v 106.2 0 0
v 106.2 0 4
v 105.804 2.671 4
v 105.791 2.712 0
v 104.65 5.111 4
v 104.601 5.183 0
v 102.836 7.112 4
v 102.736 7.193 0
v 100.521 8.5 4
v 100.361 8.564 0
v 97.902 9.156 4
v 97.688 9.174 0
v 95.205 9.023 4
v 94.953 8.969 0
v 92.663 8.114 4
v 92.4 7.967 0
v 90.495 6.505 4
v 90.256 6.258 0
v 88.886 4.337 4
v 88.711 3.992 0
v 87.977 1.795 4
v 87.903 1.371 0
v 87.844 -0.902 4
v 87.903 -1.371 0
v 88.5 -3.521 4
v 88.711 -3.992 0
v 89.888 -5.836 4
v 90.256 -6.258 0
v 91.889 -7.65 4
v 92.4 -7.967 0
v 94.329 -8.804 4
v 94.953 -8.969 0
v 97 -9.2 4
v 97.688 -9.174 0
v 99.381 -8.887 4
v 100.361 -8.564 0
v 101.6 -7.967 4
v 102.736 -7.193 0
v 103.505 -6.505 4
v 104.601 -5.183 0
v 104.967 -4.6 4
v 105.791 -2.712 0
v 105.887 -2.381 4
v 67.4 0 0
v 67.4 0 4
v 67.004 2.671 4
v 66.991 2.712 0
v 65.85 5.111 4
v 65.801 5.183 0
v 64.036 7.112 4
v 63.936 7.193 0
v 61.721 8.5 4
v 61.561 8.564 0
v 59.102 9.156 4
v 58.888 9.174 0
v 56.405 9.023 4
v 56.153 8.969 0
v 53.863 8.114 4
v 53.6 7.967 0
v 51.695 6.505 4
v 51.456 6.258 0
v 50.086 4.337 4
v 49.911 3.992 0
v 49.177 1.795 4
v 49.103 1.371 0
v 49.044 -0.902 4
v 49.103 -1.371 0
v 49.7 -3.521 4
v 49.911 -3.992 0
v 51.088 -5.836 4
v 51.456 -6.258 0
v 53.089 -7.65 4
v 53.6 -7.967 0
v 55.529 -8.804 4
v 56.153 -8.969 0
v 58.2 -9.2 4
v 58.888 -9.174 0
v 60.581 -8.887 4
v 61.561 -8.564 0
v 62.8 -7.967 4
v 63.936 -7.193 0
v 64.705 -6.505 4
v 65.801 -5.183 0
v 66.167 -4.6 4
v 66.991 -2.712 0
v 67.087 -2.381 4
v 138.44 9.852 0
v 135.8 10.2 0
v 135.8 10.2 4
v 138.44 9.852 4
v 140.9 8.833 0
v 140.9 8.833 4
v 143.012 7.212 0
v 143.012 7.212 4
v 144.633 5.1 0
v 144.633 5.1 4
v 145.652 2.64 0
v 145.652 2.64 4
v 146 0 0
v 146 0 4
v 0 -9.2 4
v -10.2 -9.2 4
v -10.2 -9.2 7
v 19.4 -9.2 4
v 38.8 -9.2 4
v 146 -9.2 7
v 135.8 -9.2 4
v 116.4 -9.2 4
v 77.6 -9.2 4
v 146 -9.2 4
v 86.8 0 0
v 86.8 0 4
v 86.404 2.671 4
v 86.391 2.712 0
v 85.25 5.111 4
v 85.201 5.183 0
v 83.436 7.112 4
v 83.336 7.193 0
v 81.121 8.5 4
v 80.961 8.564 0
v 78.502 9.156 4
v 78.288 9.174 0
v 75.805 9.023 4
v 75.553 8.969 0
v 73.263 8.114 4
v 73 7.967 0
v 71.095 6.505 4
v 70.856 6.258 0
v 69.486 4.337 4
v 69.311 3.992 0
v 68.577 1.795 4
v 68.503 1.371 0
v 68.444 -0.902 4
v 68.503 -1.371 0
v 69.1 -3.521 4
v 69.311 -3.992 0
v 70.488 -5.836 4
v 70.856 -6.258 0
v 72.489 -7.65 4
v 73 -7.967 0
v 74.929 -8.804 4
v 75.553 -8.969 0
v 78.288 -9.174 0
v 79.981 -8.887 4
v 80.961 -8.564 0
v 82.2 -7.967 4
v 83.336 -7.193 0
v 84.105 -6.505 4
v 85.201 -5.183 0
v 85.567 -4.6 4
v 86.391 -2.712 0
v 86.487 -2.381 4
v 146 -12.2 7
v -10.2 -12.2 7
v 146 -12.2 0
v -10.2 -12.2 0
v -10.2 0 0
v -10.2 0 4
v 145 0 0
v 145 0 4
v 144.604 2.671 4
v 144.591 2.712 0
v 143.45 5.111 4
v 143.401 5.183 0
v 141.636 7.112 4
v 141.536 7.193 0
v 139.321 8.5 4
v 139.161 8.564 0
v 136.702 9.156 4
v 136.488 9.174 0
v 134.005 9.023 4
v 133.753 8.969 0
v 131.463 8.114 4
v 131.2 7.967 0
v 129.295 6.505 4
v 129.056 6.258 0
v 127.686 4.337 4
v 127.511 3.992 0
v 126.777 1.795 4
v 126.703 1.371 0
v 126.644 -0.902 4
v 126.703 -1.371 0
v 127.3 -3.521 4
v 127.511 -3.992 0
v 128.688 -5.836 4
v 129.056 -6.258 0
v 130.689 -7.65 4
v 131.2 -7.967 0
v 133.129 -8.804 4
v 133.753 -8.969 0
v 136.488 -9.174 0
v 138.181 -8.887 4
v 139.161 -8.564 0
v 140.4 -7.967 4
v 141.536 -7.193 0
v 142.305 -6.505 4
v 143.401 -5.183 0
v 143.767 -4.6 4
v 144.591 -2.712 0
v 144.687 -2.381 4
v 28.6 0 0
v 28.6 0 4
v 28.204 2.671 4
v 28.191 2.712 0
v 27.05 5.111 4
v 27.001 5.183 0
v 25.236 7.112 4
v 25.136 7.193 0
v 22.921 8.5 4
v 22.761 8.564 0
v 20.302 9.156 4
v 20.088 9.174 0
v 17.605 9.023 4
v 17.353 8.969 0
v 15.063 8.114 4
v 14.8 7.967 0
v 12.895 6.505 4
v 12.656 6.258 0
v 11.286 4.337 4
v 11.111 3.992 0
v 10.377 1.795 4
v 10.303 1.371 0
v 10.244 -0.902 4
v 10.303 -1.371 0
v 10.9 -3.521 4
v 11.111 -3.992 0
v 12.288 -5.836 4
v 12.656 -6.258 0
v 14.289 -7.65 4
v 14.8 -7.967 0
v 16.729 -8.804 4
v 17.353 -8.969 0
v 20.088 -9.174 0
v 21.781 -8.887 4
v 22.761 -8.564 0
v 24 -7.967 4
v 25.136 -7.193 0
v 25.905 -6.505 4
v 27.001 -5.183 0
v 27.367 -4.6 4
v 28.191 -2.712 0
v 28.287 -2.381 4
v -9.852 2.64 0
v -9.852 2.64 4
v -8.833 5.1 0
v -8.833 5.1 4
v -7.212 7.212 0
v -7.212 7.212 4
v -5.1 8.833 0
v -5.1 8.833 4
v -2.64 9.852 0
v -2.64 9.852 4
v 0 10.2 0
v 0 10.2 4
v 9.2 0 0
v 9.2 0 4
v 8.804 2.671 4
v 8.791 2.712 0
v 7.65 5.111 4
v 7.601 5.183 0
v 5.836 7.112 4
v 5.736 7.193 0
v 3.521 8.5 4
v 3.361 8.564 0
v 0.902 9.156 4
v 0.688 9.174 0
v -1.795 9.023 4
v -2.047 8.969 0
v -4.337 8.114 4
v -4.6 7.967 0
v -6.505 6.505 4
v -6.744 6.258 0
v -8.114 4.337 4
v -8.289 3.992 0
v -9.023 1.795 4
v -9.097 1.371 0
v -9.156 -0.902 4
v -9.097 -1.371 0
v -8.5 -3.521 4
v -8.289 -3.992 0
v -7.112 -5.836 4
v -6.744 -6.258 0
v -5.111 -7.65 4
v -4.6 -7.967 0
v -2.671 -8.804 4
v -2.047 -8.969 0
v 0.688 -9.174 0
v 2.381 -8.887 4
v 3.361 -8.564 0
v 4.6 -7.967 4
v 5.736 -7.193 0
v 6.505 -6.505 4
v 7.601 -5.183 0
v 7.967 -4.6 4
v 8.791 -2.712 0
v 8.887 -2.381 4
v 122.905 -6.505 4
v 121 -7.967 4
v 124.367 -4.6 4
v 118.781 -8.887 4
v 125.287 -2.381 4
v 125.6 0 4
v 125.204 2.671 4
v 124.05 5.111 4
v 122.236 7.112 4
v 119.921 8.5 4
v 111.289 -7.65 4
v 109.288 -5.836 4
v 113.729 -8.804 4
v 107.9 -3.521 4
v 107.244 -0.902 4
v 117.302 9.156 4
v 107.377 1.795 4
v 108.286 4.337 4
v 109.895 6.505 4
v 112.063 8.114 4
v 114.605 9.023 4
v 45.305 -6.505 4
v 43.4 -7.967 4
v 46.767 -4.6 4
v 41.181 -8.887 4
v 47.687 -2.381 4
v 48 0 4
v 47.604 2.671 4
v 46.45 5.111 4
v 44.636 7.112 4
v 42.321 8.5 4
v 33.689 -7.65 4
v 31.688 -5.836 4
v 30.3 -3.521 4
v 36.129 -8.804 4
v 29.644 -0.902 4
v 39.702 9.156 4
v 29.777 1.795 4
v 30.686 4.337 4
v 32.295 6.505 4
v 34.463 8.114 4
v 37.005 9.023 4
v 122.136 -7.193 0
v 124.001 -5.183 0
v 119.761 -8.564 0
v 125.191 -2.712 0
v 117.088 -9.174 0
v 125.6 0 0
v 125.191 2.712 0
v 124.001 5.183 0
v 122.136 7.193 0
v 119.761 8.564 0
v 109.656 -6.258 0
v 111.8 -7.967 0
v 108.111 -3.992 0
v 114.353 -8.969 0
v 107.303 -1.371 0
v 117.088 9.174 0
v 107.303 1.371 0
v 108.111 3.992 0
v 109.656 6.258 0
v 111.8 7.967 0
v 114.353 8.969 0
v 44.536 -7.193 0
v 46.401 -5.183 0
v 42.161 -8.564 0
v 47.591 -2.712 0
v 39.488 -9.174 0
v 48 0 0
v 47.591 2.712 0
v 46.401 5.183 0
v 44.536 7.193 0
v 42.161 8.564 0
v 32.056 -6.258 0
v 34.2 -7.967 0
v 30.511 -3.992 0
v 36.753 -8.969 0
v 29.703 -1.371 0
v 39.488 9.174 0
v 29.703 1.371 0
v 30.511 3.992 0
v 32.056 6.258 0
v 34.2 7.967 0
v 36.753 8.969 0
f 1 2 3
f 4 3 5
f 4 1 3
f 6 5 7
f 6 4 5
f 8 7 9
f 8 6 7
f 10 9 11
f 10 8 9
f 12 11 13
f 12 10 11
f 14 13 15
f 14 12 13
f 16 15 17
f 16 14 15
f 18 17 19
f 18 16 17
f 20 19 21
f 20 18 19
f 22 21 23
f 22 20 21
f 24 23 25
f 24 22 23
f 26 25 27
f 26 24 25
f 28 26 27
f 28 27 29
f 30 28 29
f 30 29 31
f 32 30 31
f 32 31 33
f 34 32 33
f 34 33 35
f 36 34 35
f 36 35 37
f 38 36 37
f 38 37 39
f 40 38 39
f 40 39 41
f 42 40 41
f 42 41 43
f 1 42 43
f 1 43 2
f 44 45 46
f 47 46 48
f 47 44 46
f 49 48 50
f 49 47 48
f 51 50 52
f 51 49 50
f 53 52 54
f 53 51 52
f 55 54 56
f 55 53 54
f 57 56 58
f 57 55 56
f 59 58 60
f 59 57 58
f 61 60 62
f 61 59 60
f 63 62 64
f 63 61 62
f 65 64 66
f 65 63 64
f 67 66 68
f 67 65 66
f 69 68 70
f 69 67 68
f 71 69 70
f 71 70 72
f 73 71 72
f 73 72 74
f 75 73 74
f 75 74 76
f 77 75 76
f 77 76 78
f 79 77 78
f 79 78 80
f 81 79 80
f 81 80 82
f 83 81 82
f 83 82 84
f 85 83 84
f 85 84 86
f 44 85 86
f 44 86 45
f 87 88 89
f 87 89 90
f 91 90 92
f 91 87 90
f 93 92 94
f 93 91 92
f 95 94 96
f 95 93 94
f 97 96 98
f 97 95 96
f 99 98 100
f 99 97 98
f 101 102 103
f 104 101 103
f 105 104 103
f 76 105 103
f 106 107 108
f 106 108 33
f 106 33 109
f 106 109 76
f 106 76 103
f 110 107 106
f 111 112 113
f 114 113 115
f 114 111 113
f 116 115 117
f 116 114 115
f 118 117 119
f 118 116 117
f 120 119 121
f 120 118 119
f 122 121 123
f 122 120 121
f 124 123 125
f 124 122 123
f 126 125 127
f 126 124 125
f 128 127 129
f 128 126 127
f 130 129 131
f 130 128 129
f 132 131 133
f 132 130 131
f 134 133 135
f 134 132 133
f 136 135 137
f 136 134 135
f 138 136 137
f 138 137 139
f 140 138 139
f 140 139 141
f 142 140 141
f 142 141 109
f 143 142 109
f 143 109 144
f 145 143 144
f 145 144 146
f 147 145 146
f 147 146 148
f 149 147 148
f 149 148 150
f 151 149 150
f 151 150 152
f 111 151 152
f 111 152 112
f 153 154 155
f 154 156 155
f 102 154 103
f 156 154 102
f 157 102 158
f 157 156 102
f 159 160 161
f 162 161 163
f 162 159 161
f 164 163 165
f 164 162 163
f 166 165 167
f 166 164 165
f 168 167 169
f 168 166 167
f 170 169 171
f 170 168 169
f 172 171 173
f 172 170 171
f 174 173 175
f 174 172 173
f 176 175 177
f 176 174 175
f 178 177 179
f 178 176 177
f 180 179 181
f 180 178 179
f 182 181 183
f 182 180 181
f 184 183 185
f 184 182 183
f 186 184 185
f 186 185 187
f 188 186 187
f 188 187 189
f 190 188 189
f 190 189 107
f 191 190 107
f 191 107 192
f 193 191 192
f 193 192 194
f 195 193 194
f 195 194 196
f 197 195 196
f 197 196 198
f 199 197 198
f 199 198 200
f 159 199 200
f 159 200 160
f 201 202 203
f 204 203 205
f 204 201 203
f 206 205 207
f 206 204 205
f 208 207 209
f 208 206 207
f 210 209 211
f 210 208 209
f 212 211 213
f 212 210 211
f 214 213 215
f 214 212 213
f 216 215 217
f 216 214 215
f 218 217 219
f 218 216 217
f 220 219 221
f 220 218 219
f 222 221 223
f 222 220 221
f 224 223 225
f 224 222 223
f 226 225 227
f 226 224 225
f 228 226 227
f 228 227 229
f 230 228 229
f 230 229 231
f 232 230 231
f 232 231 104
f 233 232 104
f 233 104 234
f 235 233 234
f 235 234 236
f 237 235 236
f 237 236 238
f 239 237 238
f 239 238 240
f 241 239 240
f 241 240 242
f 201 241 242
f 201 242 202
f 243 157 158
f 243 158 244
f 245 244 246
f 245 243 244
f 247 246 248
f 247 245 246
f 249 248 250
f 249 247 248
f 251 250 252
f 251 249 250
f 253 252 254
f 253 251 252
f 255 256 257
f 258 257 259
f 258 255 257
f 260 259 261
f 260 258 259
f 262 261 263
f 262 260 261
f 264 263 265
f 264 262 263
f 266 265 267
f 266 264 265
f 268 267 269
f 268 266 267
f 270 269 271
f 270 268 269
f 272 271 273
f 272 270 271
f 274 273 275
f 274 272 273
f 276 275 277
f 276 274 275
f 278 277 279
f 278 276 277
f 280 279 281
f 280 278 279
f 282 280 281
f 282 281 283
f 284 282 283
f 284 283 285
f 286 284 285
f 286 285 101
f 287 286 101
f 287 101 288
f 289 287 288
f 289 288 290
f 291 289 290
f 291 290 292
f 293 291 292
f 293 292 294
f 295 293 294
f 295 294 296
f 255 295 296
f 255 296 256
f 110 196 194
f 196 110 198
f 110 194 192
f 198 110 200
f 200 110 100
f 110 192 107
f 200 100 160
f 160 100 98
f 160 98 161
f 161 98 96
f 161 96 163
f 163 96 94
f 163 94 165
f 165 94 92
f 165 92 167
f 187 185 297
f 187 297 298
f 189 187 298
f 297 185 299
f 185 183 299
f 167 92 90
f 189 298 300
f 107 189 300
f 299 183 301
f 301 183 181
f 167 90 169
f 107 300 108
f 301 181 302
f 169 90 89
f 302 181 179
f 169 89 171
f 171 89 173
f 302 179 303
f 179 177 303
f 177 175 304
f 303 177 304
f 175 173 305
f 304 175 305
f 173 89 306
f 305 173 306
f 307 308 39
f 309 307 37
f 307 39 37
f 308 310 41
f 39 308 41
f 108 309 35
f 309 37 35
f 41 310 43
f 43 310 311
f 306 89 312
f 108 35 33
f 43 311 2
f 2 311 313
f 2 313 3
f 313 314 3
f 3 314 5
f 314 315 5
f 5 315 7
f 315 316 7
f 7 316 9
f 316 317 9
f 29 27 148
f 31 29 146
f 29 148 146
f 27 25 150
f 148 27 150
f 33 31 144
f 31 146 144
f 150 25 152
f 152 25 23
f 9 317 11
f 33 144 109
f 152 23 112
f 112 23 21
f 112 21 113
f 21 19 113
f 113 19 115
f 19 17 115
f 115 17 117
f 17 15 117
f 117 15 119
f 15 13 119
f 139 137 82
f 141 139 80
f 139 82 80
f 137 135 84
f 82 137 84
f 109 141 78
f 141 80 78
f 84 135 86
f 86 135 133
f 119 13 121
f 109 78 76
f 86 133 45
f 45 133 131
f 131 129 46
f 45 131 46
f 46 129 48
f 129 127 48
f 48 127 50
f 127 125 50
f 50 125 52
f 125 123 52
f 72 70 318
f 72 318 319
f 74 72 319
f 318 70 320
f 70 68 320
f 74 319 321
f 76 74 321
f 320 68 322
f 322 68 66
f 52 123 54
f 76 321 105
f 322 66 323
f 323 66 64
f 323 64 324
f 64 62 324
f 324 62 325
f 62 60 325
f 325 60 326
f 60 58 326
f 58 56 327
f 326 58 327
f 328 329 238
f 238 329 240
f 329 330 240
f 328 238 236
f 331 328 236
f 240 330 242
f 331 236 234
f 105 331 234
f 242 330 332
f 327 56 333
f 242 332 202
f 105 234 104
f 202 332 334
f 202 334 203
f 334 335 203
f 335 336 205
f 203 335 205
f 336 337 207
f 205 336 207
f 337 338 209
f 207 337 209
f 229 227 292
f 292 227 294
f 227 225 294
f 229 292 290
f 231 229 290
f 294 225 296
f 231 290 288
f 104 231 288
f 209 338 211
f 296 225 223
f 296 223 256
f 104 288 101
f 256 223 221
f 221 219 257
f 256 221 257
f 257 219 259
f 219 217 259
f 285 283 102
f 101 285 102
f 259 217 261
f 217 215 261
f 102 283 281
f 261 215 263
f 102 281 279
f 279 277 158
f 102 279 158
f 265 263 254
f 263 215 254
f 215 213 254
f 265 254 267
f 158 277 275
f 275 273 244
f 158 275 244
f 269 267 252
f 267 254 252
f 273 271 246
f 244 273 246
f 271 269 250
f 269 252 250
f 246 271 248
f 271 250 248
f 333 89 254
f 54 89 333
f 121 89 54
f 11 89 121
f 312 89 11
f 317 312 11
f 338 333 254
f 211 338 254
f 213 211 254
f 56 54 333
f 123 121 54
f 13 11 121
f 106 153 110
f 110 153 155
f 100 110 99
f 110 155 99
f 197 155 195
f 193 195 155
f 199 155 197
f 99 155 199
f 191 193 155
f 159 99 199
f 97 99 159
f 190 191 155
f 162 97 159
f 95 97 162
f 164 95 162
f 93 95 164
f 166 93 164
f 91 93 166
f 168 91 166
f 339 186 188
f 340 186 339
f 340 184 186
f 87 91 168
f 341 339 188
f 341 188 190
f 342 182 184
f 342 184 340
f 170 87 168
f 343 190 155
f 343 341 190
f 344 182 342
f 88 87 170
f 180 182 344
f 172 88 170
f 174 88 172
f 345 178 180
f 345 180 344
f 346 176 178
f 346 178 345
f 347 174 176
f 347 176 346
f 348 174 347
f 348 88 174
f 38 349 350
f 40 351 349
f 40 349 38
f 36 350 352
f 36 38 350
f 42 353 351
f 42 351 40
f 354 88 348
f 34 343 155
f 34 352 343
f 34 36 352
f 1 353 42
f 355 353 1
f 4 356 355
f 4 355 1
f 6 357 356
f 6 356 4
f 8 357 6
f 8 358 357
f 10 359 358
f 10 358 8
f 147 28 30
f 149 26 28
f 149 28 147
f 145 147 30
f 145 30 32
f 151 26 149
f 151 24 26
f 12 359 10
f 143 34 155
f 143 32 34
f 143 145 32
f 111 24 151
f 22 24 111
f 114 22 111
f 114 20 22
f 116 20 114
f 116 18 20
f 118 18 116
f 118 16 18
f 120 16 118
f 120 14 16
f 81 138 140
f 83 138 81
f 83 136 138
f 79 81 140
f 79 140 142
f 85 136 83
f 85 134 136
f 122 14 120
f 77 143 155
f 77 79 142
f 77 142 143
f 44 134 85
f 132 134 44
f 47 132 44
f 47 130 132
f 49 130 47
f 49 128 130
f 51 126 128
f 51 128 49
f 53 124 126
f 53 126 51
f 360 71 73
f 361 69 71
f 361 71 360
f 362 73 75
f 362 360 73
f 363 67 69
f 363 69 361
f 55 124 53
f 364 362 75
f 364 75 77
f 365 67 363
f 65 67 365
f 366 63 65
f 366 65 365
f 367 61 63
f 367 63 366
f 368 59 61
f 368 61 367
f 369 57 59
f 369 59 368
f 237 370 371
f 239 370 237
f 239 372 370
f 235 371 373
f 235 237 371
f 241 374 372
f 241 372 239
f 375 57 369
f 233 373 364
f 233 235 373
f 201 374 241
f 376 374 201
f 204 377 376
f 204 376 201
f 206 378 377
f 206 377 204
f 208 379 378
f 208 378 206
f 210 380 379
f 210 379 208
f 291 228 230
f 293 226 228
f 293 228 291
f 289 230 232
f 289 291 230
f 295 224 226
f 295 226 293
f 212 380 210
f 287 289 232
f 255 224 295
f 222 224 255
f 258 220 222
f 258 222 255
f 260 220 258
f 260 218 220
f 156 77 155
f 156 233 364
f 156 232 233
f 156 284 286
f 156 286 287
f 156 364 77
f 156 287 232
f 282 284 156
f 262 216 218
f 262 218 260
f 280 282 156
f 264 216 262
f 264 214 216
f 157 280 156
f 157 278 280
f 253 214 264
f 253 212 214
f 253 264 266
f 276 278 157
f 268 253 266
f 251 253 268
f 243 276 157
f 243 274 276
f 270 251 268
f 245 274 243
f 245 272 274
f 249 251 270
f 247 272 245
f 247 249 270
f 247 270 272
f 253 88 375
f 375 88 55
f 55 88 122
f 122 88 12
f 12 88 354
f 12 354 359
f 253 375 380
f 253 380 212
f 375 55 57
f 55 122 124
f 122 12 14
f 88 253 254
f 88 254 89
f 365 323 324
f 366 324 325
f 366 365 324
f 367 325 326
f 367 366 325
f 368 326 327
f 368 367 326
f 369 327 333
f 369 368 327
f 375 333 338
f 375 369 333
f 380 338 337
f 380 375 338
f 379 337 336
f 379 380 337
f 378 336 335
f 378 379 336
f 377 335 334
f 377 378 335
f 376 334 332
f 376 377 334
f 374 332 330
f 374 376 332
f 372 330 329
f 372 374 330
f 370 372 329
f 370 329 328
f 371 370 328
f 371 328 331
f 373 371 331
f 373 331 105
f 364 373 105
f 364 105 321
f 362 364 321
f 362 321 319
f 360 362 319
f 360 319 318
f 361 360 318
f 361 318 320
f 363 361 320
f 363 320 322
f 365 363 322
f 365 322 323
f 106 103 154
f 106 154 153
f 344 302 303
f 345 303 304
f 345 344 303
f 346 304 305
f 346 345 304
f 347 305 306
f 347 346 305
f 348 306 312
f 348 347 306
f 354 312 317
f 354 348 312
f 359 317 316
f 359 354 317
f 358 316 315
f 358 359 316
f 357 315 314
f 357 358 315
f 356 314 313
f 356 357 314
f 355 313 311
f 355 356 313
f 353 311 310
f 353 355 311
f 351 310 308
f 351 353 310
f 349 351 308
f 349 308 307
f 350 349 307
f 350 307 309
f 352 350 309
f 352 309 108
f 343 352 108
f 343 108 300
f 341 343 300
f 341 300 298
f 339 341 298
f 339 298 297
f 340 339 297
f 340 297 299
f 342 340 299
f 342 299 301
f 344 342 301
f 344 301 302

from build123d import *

# Parameters (mm, degrees)
SKETCH1_R           = 9.2
BOSS_EXTRUDE1_DEPTH = 4
SKETCH2_W           = 156.2
SKETCH2_H           = 3
BOSS_EXTRUDE2_DEPTH = 3


with BuildPart() as part:
    # Sketch1 → Boss-Extrude1 (new body)
    with BuildSketch(Plane.XY):
        with BuildLine():
            Line((0, 10.2), (135.8, 10.2))
            ThreePointArc((135.8, 10.2), (143.012489168, 7.212489168), (146, 0))
            Line((146, 0), (146, -12.2))
            Line((146, -12.2), (-10.2, -12.2))
            Line((-10.2, -12.2), (-10.2, 0))
            ThreePointArc((-10.2, 0), (-7.212489168, 7.212489168), (0, 10.2))
        make_face()
        Circle(SKETCH1_R, mode=Mode.SUBTRACT)
        with Locations((19.4, 0)):
            Circle(SKETCH1_R, mode=Mode.SUBTRACT)
        with Locations((38.8, 0)):
            Circle(SKETCH1_R, mode=Mode.SUBTRACT)
        with Locations((58.2, 0)):
            Circle(SKETCH1_R, mode=Mode.SUBTRACT)
        with Locations((77.6, 0)):
            Circle(SKETCH1_R, mode=Mode.SUBTRACT)
        with Locations((97, 0)):
            Circle(SKETCH1_R, mode=Mode.SUBTRACT)
        with Locations((116.4, 0)):
            Circle(SKETCH1_R, mode=Mode.SUBTRACT)
        with Locations((135.8, 0)):
            Circle(SKETCH1_R, mode=Mode.SUBTRACT)
    extrude(amount=BOSS_EXTRUDE1_DEPTH)

    # Sketch2 → Boss-Extrude2 (add)
    with BuildSketch(Plane.XY.offset(4)):
        with Locations((67.9, -10.7)):
            Rectangle(SKETCH2_W, SKETCH2_H)
    extrude(amount=BOSS_EXTRUDE2_DEPTH)


solid = part.part
